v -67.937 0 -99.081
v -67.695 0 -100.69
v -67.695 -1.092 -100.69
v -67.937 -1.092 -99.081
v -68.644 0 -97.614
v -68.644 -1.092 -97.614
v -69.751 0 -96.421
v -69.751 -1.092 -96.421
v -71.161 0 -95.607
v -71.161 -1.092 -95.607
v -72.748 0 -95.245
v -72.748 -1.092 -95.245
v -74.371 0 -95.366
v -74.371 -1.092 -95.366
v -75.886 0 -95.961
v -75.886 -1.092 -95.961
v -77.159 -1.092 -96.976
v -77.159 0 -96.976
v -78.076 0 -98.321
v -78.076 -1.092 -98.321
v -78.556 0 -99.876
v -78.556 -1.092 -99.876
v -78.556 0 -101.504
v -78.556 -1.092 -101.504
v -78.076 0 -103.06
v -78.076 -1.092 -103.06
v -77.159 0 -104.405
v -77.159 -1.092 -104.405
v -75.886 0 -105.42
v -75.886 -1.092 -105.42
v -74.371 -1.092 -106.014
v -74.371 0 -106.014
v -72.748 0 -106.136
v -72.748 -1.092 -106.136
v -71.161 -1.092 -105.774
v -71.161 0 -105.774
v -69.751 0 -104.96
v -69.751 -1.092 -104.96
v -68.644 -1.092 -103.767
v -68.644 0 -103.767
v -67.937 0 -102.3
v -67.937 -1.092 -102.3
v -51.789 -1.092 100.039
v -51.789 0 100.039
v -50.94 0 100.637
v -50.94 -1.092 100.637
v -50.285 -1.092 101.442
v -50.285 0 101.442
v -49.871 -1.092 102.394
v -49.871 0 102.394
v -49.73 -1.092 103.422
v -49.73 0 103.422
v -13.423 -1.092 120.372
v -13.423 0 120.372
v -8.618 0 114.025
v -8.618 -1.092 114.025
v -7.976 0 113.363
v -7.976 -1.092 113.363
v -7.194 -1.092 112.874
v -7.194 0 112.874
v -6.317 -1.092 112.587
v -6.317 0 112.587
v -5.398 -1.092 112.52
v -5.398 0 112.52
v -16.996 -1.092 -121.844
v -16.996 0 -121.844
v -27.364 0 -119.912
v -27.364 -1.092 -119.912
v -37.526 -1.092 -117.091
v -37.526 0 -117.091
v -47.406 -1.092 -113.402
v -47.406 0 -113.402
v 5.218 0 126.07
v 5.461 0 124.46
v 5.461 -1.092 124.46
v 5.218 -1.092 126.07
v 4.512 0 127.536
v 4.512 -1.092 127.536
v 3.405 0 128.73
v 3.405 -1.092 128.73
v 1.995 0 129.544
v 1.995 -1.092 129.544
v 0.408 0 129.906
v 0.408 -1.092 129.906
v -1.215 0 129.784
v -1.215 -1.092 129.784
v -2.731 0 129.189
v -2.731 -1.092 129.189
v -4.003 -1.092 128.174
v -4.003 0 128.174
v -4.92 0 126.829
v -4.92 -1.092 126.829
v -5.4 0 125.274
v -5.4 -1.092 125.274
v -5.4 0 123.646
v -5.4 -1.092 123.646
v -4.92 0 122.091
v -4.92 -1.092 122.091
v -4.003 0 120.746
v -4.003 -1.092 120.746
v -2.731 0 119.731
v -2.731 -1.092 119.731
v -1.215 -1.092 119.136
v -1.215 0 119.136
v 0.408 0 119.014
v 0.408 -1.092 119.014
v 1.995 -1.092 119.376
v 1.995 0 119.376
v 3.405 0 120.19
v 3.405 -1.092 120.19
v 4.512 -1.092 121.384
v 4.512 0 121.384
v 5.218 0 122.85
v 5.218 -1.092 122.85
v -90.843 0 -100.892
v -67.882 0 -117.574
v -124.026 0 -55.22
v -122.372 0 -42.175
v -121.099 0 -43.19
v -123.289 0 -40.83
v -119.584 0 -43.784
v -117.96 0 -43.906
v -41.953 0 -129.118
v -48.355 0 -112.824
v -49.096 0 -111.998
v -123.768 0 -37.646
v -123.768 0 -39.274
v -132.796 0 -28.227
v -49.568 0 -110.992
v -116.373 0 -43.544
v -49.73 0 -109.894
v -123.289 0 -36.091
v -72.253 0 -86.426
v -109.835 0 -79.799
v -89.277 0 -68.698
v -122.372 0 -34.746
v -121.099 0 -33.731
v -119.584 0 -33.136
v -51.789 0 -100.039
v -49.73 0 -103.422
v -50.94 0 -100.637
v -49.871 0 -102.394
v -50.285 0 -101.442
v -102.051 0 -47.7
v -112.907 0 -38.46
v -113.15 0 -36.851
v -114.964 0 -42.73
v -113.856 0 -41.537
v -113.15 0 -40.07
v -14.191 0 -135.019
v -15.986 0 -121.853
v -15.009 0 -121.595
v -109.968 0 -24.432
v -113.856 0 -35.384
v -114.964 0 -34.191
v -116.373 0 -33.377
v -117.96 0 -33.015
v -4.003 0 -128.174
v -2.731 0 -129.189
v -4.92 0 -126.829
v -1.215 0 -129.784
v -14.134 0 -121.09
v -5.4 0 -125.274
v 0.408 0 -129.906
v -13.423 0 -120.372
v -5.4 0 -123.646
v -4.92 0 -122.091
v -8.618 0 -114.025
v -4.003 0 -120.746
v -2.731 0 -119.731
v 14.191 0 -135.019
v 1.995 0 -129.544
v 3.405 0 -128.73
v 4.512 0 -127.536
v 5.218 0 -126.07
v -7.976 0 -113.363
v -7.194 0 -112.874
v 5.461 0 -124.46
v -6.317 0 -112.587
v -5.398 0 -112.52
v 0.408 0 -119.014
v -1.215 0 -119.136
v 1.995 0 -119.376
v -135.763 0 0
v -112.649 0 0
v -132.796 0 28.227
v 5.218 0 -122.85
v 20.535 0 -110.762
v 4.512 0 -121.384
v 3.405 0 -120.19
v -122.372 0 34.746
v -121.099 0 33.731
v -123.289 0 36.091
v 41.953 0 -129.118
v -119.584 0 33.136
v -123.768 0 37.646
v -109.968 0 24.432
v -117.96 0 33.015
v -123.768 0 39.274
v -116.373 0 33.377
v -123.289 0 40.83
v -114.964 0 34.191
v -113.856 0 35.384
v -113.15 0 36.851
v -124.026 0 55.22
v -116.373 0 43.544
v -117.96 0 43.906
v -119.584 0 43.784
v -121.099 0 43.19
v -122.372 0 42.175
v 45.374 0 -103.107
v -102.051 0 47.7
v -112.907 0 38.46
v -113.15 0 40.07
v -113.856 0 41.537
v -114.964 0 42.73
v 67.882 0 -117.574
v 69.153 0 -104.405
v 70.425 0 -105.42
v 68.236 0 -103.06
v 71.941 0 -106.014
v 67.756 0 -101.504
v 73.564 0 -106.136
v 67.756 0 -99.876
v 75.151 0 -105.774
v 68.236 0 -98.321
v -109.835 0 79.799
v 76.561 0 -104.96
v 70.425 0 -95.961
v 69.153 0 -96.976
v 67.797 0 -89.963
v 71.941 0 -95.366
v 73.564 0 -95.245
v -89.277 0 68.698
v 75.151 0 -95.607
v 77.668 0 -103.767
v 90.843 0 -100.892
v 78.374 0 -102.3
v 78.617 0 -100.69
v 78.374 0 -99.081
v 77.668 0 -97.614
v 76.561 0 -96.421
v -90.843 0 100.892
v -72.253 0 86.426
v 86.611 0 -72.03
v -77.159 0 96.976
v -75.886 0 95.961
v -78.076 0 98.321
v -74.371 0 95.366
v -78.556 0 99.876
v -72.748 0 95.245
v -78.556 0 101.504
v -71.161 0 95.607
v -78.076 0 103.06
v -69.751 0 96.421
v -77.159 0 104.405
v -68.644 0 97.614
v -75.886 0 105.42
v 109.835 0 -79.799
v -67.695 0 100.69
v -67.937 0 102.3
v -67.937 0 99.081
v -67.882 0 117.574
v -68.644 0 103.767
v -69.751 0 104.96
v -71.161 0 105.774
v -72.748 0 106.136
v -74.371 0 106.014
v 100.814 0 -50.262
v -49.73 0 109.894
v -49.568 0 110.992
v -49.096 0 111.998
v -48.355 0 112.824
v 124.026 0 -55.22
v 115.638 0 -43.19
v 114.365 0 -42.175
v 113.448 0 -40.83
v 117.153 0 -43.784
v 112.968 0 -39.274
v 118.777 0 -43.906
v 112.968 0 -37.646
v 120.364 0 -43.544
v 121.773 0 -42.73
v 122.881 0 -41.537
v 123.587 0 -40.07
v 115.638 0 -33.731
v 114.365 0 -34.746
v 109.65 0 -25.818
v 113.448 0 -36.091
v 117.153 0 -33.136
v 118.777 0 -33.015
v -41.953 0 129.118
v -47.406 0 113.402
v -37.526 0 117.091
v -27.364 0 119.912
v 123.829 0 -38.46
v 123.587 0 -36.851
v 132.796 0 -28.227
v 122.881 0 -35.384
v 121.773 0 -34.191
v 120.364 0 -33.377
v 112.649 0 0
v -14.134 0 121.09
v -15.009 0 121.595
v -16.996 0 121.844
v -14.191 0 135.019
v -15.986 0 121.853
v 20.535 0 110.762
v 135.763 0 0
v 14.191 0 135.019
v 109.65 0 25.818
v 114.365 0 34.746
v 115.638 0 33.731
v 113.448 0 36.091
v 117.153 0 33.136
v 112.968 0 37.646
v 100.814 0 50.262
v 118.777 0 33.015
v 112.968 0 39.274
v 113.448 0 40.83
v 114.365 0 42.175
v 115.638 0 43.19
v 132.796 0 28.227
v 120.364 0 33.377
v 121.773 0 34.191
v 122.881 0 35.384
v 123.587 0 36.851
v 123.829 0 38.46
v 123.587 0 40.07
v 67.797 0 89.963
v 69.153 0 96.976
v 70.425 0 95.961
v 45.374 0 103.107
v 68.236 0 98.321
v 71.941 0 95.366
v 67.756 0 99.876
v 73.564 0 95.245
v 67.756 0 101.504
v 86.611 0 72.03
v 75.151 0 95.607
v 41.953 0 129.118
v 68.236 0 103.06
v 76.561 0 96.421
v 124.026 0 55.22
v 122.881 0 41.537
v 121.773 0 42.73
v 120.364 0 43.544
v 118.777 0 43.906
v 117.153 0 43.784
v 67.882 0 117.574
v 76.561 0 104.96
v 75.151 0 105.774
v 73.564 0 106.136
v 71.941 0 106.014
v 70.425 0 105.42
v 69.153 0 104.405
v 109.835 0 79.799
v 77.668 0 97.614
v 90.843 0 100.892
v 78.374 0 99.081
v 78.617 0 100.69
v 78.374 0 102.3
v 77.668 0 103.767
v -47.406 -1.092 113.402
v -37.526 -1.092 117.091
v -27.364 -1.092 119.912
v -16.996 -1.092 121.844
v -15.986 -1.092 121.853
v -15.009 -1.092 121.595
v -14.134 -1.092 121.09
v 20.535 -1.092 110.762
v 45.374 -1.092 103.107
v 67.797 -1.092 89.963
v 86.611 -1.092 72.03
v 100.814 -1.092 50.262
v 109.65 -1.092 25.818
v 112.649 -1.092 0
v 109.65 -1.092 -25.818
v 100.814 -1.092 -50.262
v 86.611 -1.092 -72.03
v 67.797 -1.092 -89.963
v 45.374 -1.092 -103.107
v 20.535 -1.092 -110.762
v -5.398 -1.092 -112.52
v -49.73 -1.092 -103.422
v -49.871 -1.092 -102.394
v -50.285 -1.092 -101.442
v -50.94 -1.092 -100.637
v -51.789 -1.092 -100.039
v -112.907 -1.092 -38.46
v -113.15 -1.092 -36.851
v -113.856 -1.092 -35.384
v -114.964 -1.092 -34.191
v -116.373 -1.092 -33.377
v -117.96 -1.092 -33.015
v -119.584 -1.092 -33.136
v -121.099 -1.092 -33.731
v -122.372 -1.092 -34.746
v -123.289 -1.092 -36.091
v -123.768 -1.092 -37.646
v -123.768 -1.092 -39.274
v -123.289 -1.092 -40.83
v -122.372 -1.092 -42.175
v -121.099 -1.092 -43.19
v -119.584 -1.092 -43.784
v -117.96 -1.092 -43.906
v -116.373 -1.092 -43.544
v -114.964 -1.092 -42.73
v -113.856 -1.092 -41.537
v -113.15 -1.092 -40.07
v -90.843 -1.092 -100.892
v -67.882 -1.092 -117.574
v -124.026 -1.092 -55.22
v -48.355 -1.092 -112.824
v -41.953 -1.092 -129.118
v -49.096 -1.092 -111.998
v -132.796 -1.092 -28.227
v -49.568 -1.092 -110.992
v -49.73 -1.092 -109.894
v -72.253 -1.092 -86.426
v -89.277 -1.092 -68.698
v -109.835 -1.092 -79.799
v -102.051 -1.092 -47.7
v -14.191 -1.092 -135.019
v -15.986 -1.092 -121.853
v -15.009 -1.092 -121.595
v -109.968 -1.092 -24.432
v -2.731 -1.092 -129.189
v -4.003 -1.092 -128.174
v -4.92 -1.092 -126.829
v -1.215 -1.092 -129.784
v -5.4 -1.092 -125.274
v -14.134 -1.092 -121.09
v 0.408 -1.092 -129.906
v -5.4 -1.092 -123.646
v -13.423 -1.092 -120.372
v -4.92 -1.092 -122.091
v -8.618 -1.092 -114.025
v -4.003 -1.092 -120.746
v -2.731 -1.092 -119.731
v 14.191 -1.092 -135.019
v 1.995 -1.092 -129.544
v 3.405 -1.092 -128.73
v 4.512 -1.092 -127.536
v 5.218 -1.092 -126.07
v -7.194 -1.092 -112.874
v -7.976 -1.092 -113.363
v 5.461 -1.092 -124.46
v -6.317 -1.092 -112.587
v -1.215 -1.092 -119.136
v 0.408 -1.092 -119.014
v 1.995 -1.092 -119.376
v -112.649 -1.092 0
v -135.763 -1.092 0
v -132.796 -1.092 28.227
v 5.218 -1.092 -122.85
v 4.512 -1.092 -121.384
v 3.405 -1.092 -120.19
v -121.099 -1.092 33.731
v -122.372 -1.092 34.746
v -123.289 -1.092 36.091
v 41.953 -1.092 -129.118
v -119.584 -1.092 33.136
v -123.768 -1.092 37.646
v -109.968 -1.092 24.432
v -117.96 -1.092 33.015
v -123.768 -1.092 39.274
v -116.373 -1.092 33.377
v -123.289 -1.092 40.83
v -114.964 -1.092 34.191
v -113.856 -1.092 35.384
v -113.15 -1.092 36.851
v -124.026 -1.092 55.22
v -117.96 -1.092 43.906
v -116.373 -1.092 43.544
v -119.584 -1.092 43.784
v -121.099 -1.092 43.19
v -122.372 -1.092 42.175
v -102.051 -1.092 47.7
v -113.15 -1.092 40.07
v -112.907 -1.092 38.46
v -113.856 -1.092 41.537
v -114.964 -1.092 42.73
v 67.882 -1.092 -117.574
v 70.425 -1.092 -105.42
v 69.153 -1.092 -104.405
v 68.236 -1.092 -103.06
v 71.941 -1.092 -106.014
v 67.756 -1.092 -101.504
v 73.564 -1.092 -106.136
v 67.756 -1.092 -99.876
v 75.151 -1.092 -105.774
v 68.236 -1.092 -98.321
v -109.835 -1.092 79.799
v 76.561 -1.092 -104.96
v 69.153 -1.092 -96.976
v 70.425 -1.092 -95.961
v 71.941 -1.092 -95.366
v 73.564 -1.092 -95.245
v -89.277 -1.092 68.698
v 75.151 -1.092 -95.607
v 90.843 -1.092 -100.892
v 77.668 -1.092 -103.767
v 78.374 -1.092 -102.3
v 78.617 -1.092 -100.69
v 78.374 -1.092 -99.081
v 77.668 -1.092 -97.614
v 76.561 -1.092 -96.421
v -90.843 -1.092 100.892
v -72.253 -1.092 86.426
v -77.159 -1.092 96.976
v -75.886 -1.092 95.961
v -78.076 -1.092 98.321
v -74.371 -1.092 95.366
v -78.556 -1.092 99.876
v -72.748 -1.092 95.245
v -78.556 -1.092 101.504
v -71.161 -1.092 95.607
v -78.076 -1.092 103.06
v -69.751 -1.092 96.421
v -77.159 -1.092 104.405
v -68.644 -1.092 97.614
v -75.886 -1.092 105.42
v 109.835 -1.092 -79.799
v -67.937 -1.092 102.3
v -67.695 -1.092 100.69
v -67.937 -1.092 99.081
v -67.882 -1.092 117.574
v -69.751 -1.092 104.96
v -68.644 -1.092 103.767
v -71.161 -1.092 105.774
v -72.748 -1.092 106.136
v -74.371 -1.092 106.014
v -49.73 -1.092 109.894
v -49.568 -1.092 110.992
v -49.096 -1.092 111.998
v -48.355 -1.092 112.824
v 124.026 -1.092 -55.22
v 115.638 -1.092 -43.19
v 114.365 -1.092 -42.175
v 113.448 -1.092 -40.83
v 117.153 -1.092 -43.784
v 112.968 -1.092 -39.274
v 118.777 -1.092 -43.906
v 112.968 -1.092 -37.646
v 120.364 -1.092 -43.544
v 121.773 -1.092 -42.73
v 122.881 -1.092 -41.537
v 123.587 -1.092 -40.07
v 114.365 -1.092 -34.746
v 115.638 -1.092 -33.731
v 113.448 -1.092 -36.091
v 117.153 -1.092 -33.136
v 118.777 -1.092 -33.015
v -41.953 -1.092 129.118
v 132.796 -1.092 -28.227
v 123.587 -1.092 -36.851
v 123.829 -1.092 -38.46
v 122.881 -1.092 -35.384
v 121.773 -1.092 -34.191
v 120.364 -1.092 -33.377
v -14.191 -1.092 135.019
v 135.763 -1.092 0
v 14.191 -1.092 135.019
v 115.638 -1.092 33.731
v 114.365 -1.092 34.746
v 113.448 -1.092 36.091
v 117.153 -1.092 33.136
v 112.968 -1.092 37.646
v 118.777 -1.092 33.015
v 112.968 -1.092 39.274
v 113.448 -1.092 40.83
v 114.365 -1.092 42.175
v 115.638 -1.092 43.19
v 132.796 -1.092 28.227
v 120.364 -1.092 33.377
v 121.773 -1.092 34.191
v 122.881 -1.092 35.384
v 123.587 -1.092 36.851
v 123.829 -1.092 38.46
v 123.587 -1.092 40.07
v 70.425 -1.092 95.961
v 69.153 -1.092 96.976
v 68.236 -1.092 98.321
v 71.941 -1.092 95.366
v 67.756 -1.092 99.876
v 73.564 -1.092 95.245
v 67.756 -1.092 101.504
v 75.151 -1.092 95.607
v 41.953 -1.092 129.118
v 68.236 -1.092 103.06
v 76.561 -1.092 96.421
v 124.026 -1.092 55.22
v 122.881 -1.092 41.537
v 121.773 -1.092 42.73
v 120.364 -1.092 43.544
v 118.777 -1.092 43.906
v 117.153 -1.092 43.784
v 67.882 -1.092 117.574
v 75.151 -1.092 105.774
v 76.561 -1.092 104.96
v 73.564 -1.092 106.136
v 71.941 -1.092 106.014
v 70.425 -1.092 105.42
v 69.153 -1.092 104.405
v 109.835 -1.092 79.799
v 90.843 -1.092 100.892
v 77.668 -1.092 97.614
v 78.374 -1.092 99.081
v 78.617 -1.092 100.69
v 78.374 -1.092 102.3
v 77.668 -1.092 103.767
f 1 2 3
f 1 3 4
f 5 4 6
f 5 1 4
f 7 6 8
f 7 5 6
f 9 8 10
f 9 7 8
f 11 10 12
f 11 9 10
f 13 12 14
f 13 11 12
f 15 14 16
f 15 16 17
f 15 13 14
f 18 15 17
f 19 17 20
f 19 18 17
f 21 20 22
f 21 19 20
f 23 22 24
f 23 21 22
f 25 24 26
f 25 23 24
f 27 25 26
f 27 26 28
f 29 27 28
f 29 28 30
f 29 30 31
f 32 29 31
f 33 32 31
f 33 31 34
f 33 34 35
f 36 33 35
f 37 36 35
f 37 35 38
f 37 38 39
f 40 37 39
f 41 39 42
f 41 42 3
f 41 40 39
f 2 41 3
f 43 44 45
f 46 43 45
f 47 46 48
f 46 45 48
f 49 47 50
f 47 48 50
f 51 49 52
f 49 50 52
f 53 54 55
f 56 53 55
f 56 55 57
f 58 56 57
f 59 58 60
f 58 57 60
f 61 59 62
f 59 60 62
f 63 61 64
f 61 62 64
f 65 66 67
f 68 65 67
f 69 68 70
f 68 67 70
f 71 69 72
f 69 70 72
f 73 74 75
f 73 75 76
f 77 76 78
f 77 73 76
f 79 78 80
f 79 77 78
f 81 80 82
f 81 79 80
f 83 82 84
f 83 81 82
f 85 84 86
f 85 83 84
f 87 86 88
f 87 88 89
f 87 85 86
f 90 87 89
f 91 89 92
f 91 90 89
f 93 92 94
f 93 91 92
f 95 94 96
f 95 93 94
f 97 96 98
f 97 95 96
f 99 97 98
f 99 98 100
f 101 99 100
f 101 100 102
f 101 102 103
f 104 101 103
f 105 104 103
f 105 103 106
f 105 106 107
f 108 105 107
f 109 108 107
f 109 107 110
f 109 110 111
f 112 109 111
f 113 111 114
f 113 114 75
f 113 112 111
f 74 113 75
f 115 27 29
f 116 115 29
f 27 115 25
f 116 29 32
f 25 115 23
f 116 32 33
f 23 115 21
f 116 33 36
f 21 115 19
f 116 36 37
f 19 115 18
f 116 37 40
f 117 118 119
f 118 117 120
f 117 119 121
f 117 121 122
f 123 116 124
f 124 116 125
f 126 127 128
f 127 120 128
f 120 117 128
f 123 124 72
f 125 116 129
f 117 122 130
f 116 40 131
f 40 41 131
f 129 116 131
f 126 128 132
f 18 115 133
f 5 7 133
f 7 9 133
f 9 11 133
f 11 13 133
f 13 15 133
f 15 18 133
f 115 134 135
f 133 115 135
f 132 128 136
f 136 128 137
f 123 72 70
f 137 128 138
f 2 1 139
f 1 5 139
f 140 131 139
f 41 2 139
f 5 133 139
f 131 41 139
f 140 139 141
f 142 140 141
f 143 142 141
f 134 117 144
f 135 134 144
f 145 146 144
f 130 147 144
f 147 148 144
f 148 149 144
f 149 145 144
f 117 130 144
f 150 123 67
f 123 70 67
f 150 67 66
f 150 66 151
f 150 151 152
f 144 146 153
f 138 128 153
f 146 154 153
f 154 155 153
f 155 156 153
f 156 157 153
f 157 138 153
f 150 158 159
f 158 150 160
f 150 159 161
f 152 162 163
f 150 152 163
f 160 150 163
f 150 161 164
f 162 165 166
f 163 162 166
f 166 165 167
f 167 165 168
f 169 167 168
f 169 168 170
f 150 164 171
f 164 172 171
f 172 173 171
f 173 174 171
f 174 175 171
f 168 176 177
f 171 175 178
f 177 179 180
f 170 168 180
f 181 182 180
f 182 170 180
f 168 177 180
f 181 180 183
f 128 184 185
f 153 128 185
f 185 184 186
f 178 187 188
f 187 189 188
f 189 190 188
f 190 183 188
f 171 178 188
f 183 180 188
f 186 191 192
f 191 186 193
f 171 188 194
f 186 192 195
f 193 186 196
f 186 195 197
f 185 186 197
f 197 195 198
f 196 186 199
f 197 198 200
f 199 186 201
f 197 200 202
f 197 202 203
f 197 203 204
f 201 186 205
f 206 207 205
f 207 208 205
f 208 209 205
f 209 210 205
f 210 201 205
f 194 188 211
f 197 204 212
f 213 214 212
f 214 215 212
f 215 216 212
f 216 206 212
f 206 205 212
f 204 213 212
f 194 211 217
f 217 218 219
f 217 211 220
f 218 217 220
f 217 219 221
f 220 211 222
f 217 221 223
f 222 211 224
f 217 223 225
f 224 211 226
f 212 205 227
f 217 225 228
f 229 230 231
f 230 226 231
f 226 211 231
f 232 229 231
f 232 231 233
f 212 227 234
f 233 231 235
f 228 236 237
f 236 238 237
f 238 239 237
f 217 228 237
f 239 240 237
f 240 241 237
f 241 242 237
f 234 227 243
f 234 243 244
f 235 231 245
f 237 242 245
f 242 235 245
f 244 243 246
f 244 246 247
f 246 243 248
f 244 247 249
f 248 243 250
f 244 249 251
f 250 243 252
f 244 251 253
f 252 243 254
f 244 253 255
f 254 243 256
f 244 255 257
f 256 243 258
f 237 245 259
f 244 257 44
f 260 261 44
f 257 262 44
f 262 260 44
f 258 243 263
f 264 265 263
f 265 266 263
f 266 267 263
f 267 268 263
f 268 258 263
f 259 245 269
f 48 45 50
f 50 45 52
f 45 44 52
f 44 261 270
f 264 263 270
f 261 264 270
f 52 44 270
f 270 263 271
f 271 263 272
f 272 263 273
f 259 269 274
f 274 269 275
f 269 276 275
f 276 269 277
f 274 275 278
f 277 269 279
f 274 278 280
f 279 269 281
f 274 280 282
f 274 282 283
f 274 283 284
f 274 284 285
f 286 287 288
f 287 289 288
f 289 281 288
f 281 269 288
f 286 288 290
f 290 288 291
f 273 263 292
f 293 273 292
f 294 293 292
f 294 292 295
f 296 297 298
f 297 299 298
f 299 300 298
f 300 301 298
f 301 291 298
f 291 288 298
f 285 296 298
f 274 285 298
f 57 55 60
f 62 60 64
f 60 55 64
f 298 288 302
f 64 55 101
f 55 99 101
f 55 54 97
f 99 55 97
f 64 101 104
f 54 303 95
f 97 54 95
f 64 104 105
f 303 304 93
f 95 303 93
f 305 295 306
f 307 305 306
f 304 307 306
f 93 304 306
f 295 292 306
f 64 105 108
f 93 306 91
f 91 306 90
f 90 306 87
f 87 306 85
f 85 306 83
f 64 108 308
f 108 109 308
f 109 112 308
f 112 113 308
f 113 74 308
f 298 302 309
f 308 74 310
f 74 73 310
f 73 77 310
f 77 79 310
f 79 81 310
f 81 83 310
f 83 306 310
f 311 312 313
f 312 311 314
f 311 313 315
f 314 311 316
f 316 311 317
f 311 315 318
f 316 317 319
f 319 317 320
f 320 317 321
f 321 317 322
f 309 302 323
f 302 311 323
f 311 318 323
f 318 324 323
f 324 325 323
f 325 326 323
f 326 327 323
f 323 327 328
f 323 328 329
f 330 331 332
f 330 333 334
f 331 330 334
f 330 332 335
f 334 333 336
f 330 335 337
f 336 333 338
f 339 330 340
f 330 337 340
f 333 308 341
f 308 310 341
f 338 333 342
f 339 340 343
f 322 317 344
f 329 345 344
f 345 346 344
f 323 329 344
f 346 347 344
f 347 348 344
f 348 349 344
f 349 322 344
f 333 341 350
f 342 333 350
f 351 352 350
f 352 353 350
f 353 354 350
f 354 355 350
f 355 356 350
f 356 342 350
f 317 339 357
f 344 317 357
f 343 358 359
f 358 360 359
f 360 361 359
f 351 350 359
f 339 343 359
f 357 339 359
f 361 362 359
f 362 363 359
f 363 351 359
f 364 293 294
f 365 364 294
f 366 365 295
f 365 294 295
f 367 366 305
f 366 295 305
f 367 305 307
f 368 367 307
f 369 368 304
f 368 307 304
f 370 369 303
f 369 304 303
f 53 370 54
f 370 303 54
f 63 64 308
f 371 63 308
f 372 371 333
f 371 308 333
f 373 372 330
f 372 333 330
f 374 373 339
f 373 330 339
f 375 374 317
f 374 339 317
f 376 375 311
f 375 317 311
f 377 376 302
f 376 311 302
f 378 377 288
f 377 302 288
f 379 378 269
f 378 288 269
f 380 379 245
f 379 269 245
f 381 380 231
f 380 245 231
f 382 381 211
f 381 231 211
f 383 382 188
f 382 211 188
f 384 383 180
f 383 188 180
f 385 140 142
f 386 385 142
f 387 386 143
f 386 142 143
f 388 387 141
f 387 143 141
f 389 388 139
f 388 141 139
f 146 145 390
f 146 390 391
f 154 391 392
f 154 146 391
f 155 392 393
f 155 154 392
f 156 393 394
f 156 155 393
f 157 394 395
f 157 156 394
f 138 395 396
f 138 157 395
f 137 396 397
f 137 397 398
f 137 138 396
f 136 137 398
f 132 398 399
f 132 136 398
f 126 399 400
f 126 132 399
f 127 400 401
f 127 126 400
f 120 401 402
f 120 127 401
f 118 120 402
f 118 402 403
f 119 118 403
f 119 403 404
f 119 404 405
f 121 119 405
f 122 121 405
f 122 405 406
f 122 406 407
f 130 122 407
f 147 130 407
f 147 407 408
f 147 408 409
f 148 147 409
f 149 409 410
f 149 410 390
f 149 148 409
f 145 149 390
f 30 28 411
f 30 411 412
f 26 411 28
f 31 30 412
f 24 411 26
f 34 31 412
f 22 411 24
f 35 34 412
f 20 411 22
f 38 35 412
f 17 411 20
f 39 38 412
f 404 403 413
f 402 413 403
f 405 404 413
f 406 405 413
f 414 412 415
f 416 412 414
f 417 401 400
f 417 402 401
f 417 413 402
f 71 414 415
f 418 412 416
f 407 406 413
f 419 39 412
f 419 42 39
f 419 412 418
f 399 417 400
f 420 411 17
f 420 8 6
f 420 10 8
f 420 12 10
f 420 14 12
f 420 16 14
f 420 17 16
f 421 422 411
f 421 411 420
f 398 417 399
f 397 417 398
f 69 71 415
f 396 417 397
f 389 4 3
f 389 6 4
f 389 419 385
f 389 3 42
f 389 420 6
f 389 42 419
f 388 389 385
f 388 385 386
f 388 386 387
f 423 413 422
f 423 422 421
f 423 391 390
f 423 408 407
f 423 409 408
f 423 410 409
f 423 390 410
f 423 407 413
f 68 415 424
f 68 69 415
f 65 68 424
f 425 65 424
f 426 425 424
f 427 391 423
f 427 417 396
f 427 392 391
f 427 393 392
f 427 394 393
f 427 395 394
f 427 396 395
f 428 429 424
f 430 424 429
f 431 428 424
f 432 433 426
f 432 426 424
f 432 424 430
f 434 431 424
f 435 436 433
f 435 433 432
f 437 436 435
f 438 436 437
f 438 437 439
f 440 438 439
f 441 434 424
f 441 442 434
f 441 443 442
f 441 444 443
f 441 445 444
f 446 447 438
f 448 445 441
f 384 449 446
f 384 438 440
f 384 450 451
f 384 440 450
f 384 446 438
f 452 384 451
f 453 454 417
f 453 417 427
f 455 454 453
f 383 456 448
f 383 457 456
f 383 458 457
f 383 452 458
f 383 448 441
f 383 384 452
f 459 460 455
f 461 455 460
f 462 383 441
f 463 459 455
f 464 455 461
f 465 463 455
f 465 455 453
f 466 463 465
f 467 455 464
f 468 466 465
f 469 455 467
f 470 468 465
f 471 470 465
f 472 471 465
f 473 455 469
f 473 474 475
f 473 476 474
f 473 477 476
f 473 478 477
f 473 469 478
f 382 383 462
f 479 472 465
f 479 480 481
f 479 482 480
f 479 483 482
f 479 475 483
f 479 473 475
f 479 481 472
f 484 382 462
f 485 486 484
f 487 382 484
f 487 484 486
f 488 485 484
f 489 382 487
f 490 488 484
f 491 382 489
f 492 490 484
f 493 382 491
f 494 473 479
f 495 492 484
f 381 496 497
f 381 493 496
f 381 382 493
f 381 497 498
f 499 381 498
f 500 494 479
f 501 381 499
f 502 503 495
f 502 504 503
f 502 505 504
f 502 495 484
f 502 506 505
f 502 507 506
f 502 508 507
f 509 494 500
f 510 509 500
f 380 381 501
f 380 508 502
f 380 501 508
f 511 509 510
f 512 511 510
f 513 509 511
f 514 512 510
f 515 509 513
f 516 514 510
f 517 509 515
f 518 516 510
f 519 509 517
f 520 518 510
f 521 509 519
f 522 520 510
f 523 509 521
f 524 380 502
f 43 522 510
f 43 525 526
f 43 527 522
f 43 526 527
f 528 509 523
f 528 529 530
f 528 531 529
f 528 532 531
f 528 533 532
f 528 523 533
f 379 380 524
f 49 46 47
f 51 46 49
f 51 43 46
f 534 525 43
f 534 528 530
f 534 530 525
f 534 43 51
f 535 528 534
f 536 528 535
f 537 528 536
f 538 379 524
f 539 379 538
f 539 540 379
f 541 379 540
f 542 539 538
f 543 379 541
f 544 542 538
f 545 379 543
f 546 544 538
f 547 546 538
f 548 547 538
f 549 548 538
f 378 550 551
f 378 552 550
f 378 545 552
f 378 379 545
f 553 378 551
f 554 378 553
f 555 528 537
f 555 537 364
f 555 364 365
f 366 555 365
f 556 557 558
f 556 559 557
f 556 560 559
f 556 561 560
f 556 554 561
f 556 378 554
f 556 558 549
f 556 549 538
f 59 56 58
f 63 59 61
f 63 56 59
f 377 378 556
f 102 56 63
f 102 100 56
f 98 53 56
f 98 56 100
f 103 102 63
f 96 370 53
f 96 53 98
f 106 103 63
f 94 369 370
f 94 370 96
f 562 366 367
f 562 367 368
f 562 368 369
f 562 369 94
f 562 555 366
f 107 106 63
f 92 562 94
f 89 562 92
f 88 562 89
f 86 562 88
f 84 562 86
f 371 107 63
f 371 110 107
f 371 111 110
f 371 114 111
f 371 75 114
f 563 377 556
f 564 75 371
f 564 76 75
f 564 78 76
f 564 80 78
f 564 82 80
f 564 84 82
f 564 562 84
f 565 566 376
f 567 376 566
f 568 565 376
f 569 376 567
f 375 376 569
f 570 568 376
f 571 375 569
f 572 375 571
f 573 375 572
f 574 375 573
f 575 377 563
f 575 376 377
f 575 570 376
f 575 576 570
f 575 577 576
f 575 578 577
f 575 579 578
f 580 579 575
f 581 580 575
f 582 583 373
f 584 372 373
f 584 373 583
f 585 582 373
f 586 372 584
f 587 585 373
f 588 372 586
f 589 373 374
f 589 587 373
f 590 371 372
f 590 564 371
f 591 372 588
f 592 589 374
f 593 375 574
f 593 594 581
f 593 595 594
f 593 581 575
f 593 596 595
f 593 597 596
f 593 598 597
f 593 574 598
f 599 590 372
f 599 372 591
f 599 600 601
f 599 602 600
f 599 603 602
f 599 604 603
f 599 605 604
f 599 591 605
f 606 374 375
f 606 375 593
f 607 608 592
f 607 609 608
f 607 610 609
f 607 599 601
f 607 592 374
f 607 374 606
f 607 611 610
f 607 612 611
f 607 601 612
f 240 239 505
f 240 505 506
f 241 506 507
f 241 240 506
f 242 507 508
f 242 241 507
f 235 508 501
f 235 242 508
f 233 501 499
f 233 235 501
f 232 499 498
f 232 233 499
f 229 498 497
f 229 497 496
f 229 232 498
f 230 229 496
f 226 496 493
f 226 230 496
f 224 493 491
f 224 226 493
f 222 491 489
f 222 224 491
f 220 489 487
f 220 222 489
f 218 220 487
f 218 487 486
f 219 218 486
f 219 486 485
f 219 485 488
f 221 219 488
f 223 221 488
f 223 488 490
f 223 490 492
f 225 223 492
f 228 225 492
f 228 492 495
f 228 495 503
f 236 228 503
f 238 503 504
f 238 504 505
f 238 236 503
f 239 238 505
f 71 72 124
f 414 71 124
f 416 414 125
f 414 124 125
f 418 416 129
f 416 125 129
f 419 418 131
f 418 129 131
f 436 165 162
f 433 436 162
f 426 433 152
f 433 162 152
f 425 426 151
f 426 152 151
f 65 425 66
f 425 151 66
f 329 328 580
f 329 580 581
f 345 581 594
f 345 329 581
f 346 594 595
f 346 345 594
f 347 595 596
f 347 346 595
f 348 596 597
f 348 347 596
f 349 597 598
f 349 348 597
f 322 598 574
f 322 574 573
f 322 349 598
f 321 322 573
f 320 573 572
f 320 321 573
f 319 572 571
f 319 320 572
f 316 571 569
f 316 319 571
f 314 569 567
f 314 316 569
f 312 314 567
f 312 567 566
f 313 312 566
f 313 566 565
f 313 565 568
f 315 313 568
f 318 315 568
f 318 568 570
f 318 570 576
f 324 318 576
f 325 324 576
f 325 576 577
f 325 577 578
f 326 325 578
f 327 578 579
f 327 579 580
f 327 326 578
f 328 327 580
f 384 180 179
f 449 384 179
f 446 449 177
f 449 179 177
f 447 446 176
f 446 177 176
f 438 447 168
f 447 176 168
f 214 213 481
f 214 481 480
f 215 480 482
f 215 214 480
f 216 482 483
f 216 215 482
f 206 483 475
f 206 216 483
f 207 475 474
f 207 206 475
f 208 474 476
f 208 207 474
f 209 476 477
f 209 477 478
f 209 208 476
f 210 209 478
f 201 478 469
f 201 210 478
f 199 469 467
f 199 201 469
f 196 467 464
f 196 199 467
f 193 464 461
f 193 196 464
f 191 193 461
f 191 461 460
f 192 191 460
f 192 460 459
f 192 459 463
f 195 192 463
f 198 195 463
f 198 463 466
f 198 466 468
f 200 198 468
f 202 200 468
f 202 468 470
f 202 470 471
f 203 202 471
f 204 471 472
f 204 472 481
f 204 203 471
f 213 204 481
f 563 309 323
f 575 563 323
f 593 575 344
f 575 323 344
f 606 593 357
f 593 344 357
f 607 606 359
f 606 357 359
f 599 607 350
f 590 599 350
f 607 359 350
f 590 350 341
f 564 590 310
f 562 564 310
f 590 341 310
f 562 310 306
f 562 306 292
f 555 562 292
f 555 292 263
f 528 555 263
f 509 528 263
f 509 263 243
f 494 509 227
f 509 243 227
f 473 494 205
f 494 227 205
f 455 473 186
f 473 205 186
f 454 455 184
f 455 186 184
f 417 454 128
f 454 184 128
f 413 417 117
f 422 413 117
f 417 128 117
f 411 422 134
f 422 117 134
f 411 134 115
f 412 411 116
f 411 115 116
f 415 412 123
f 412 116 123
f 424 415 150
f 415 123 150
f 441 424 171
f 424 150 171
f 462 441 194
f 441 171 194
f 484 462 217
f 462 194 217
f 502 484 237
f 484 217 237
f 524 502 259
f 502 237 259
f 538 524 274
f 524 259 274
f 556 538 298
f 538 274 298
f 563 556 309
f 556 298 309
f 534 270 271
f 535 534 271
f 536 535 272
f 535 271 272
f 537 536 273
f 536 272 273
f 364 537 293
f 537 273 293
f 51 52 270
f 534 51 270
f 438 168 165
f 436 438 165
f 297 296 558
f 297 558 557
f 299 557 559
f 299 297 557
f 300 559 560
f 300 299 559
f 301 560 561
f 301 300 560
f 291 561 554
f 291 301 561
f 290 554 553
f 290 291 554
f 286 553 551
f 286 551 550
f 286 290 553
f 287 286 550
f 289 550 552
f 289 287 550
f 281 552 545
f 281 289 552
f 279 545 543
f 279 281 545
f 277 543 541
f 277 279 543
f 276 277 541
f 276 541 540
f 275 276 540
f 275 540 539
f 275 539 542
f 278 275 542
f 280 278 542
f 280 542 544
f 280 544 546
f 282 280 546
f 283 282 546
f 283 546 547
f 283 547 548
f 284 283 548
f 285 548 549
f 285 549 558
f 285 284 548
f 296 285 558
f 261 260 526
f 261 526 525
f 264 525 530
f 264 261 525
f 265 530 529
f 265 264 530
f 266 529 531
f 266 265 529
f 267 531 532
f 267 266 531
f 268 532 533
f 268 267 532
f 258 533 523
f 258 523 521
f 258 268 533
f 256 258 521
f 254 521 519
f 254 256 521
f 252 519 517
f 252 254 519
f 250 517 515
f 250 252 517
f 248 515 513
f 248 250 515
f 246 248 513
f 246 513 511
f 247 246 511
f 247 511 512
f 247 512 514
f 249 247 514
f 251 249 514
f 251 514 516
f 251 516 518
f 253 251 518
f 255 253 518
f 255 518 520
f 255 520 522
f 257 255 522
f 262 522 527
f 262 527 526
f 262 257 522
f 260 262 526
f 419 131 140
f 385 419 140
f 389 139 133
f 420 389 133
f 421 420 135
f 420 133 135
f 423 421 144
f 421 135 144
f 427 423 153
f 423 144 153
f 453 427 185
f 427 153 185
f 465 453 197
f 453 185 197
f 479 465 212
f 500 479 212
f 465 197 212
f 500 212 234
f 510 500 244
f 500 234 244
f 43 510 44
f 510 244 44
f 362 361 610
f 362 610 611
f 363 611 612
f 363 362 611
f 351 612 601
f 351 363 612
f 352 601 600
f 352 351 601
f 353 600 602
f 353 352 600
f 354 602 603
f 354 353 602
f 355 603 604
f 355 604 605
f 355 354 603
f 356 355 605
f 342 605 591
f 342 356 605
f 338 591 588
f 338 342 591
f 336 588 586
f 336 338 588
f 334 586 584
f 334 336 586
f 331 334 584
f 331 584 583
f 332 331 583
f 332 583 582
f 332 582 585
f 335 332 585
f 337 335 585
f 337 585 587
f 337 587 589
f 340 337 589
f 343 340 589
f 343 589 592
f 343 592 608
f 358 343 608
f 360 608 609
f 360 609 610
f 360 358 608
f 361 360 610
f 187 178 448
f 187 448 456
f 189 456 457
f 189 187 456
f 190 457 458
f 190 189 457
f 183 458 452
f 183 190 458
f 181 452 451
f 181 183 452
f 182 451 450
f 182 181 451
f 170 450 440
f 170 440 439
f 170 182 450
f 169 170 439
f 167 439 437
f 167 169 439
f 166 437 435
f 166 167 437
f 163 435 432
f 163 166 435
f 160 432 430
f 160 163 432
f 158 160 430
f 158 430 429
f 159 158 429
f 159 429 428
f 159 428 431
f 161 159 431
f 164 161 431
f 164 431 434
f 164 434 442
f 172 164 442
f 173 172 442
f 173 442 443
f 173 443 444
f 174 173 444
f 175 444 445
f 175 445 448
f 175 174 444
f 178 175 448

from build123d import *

# Parameters (mm, degrees)
F0_R     = 135.763
F0_R_2   = 5.461
F1_DEPTH = 1.0922


with BuildPart() as f1:
    # F0 (on Front) → F1 (new body)
    with BuildSketch(Plane.XZ):
        with BuildLine():
            ThreePointArc((-49.730106, 103.42222), (-50.285138, 101.441998), (-51.788522, 100.038724))
            ThreePointArc((-51.788522, 100.038724), (-112.649, 0), (-51.788522, -100.038724))
            ThreePointArc((-51.788522, -100.038724), (-50.285138, -101.441998), (-49.730106, -103.42222))
            Line((-49.730106, -103.42222), (-49.730106, -109.893576))
            ThreePointArc((-49.730106, -109.893576), (-49.096339, -111.997773), (-47.405883, -113.401933))
            ThreePointArc((-47.405883, -113.401933), (-32.475361, -118.611287), (-16.996183, -121.844388))
            ThreePointArc((-16.996183, -121.844388), (-15.00917, -121.594865), (-13.423186, -120.372107))
            Line((-13.423186, -120.372107), (-8.61764, -114.025335))
            ThreePointArc((-8.61764, -114.025335), (-7.193966, -112.873921), (-5.397561, -112.519614))
            ThreePointArc((-5.397561, -112.519614), (112.649, 0), (-5.397561, 112.519614))
            ThreePointArc((-5.397561, 112.519614), (-7.193966, 112.873921), (-8.61764, 114.025335))
            Line((-8.61764, 114.025335), (-13.423186, 120.372107))
            ThreePointArc((-13.423186, 120.372107), (-15.00917, 121.594865), (-16.996183, 121.844388))
            ThreePointArc((-16.996183, 121.844388), (-32.475361, 118.611287), (-47.405883, 113.401933))
            ThreePointArc((-47.405883, 113.401933), (-49.096339, 111.997773), (-49.730106, 109.893576))
            Line((-49.730106, 109.893576), (-49.730106, 103.42222))
        make_face()
        Circle(F0_R)
        with Locations((-73.155753, -100.690255)):
            Circle(F0_R_2, mode=Mode.SUBTRACT)
        with Locations((-118.368494, -38.460255)):
            Circle(F0_R_2, mode=Mode.SUBTRACT)
        with Locations((0, -124.46)):
            Circle(F0_R_2, mode=Mode.SUBTRACT)
        with Locations((73.155753, -100.690255)):
            Circle(F0_R_2, mode=Mode.SUBTRACT)
        with Locations((118.368494, -38.460255)):
            Circle(F0_R_2, mode=Mode.SUBTRACT)
        with Locations((-118.368494, 38.460255)):
            Circle(F0_R_2, mode=Mode.SUBTRACT)
        with Locations((-73.155753, 100.690255)):
            Circle(F0_R_2, mode=Mode.SUBTRACT)
        with BuildLine():
            ThreePointArc((-51.788522, -100.038724), (-112.649, 0), (-51.788522, 100.038724))
            ThreePointArc((-51.788522, 100.038724), (-50.285138, 101.441998), (-49.730106, 103.42222))
            Line((-49.730106, 103.42222), (-49.730106, 109.893576))
            ThreePointArc((-49.730106, 109.893576), (-49.096339, 111.997773), (-47.405883, 113.401933))
            ThreePointArc((-47.405883, 113.401933), (-32.475361, 118.611287), (-16.996183, 121.844388))
            ThreePointArc((-16.996183, 121.844388), (-15.00917, 121.594865), (-13.423186, 120.372107))
            Line((-13.423186, 120.372107), (-8.61764, 114.025335))
            ThreePointArc((-8.61764, 114.025335), (-7.193966, 112.873921), (-5.397561, 112.519614))
            ThreePointArc((-5.397561, 112.519614), (112.649, 0), (-5.397561, -112.519614))
            ThreePointArc((-5.397561, -112.519614), (-7.193966, -112.873921), (-8.61764, -114.025335))
            Line((-8.61764, -114.025335), (-13.423186, -120.372107))
            ThreePointArc((-13.423186, -120.372107), (-15.00917, -121.594865), (-16.996183, -121.844388))
            ThreePointArc((-16.996183, -121.844388), (-32.475361, -118.611287), (-47.405883, -113.401933))
            ThreePointArc((-47.405883, -113.401933), (-49.096339, -111.997773), (-49.730106, -109.893576))
            Line((-49.730106, -109.893576), (-49.730106, -103.42222))
            ThreePointArc((-49.730106, -103.42222), (-50.285138, -101.441998), (-51.788522, -100.038724))
        make_face(mode=Mode.SUBTRACT)
        with Locations((118.368494, 38.460255)):
            Circle(F0_R_2, mode=Mode.SUBTRACT)
        with Locations((0, 124.46)):
            Circle(F0_R_2, mode=Mode.SUBTRACT)
        with Locations((73.155753, 100.690255)):
            Circle(F0_R_2, mode=Mode.SUBTRACT)
    extrude(amount=F1_DEPTH)


solid = f1.part
